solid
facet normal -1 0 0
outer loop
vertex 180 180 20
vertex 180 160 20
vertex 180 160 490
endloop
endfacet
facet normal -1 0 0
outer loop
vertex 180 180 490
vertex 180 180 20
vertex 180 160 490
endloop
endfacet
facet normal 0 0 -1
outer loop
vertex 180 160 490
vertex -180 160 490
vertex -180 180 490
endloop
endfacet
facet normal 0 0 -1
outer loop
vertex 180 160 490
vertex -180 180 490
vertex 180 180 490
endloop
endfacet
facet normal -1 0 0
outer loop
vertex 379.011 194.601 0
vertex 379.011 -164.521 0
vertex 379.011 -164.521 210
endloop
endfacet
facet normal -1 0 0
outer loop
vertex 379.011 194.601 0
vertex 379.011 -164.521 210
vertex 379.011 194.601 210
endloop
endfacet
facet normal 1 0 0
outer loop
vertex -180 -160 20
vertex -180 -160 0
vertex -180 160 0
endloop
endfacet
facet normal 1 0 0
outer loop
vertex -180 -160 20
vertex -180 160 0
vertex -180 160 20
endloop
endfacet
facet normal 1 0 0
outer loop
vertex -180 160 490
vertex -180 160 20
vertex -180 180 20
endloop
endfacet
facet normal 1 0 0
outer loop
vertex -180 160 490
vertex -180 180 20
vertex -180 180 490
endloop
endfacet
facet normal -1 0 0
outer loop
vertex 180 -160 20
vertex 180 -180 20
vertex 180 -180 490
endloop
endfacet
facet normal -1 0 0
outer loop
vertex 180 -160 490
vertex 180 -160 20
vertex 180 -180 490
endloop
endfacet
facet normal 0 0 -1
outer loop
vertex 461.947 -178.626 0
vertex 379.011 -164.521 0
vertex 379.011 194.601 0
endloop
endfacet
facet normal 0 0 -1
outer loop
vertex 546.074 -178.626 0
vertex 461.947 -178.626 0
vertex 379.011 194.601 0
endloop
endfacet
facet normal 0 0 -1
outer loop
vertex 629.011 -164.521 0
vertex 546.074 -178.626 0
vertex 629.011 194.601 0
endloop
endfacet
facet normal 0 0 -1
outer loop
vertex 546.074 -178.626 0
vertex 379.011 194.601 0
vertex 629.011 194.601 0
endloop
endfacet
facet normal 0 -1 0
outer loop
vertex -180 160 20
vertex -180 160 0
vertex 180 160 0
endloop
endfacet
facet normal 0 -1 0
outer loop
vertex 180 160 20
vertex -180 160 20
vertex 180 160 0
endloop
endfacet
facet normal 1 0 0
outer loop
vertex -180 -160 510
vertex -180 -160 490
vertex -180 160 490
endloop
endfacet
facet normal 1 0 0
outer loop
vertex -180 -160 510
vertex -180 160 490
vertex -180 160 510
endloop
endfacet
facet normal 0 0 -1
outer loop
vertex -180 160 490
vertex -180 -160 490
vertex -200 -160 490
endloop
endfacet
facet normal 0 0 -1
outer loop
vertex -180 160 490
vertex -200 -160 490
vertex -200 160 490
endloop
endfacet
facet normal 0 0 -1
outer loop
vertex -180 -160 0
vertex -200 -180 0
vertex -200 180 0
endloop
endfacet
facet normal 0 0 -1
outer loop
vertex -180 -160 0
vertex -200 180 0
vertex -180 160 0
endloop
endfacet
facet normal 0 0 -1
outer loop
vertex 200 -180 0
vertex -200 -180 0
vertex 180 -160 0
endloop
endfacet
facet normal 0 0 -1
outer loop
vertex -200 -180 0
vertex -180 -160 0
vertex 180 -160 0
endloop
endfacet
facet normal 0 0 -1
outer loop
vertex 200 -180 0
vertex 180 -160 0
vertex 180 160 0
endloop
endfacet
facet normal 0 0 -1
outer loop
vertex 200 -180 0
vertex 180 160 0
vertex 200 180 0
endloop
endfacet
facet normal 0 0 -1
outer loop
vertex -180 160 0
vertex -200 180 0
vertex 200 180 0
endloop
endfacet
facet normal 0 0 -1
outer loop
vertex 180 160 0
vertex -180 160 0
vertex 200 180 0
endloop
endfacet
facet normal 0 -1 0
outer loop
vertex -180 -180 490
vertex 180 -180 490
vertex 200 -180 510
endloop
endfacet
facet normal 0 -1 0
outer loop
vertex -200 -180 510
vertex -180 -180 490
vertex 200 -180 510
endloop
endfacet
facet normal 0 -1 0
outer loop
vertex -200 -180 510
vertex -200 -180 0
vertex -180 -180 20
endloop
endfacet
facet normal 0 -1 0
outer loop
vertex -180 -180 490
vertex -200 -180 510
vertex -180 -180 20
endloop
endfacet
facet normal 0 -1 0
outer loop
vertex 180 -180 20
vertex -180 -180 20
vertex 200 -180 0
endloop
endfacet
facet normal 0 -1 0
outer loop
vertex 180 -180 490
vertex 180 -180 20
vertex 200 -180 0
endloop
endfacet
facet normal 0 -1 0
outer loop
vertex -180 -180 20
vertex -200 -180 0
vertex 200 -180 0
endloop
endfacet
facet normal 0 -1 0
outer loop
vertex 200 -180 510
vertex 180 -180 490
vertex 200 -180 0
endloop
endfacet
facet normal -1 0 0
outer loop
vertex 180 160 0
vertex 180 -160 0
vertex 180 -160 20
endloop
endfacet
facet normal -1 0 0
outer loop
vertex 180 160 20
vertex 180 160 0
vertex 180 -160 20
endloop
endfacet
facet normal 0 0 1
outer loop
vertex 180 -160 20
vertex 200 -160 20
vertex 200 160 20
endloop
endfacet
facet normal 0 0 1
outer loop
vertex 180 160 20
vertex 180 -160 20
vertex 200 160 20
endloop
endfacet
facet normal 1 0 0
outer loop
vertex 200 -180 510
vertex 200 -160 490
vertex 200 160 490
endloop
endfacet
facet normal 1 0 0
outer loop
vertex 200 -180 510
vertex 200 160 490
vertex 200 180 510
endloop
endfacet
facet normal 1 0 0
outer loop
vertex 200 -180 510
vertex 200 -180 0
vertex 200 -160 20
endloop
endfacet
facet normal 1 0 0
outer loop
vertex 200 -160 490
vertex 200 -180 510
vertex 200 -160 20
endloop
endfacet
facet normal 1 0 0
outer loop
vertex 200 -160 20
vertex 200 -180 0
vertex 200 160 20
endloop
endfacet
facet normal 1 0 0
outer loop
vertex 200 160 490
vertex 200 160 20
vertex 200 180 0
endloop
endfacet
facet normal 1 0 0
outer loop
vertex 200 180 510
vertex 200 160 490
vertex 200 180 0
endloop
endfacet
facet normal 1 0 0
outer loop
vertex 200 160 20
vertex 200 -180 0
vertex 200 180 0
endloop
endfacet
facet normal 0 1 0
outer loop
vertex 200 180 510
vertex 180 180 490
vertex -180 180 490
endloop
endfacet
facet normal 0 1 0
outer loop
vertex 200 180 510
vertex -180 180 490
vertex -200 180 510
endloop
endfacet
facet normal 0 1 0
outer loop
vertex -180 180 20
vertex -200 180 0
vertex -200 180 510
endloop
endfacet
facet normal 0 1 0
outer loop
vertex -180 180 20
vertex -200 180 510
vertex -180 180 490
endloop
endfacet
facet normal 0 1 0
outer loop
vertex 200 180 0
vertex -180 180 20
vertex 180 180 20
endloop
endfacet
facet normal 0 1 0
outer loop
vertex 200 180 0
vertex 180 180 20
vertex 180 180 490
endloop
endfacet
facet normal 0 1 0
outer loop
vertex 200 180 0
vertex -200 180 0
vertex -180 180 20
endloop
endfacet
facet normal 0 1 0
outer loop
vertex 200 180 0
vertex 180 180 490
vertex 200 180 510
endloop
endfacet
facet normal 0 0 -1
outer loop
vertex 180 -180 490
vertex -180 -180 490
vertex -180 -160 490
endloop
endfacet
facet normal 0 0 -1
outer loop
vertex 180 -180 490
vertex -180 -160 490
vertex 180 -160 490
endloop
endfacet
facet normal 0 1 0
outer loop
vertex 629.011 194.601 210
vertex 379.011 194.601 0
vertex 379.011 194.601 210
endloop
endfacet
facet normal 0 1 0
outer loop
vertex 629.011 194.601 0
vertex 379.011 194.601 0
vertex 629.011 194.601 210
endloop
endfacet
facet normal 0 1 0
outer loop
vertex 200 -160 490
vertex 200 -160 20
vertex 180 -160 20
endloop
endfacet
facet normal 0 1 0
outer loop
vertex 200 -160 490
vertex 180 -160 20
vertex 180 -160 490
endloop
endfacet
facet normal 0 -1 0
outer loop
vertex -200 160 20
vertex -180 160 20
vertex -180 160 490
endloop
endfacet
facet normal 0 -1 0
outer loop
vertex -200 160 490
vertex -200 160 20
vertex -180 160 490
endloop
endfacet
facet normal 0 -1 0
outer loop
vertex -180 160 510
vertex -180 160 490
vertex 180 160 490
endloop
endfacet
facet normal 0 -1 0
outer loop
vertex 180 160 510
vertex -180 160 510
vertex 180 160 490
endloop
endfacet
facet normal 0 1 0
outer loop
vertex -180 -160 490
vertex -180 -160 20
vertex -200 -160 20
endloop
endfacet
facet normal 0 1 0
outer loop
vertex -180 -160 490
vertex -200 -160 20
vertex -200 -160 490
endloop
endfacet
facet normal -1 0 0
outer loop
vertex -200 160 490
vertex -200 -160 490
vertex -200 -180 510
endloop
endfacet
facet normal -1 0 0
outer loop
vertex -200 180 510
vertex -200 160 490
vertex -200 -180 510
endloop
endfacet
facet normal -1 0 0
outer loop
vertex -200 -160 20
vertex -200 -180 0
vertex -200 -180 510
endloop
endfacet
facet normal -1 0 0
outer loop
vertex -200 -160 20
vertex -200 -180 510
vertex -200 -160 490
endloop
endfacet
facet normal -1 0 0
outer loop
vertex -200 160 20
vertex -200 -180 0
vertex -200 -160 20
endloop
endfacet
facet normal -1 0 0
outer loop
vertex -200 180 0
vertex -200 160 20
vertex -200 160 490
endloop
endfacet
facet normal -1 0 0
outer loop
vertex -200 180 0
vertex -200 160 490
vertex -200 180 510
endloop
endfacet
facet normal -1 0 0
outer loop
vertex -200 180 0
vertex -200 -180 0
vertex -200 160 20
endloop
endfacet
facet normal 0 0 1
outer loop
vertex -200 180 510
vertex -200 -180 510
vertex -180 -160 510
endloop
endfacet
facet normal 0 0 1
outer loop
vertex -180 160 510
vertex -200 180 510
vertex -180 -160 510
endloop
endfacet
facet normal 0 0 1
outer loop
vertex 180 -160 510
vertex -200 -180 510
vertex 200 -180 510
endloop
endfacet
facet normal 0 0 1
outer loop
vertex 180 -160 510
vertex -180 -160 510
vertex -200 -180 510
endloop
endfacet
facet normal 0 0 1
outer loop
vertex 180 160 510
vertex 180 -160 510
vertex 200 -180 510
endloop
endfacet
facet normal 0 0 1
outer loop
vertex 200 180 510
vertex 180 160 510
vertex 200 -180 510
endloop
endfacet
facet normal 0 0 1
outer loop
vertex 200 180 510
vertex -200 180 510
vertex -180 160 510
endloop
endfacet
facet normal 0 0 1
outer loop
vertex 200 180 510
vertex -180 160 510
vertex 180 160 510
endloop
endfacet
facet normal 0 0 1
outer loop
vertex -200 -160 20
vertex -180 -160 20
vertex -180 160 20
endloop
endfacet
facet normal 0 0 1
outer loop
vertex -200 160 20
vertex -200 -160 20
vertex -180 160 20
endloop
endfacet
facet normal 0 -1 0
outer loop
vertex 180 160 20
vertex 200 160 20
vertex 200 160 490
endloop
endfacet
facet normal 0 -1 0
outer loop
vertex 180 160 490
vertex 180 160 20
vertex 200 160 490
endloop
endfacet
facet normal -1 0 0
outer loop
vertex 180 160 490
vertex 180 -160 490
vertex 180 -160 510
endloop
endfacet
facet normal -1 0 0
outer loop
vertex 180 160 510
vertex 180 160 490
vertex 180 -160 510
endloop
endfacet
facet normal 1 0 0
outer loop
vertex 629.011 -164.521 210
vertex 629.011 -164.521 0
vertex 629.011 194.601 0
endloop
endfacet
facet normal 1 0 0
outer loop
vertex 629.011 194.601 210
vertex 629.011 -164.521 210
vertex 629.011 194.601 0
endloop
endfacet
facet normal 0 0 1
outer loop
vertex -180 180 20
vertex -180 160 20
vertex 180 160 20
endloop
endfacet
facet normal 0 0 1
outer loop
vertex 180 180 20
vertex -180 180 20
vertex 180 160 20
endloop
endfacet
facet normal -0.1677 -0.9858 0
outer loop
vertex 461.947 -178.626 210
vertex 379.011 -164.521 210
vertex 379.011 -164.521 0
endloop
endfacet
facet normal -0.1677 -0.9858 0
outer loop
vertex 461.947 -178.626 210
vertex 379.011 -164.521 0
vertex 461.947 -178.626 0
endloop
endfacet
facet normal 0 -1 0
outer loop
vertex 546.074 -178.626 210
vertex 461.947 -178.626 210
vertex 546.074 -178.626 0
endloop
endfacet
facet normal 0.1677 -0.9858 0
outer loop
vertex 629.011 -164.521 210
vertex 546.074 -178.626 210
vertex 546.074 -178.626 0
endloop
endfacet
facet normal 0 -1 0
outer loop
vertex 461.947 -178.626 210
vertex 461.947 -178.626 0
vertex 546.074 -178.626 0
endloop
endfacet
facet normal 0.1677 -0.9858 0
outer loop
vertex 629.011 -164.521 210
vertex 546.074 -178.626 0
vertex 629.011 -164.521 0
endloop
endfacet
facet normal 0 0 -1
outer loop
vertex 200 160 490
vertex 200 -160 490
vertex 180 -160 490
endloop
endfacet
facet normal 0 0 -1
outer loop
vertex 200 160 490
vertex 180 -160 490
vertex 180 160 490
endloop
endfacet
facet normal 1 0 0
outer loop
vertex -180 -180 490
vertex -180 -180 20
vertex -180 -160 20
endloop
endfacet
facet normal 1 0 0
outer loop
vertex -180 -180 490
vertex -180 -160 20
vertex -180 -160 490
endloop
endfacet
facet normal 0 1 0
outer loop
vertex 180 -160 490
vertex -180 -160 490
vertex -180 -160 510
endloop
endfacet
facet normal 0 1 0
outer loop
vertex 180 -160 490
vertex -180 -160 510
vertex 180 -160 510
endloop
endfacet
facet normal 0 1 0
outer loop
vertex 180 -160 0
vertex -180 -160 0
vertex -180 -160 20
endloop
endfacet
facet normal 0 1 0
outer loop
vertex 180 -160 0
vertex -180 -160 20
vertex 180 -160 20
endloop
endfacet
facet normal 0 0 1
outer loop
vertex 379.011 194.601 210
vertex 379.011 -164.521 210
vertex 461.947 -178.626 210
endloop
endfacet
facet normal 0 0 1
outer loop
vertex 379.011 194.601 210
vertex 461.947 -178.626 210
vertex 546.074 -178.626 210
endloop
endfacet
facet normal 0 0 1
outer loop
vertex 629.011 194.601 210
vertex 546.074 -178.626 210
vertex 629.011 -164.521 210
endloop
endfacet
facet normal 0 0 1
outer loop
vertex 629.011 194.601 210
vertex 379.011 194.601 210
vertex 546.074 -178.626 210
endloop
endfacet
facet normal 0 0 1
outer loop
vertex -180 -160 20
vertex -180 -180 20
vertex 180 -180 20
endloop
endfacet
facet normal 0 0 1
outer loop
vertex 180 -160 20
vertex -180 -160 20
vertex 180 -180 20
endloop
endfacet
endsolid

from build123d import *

# Parameters (mm, degrees)
F0_W     = 400
F0_H     = 360
F0_W_2   = 360
F0_H_2   = 320
F1_DEPTH = 510
F2_W     = 360
F2_H     = 470
F3_DEPTH = 638.111826
F4_W     = 320
F4_H     = 470
F5_DEPTH = 520
F0_W_3   = 250
F0_H_3   = 359.122919
F6_DEPTH = 210


with BuildPart() as f1:
    # F0 (on Top) → F1 (new body)
    with BuildSketch(Plane.XY):
        Rectangle(F0_W, F0_H)
        Rectangle(F0_W_2, F0_H_2, mode=Mode.SUBTRACT)
    extrude(amount=F1_DEPTH)

    # F2 (on face) → F3 (cut)
    with BuildSketch(Plane.XZ.offset(180)):
        with Locations((0, 255)):
            Rectangle(F2_W, F2_H)
    extrude(amount=-F3_DEPTH, mode=Mode.SUBTRACT)

    # F4 (on face) → F5 (cut)
    with BuildSketch(Plane.YZ.offset(200)):
        with Locations((0, 255)):
            Rectangle(F4_W, F4_H)
    extrude(amount=-F5_DEPTH, mode=Mode.SUBTRACT)


with BuildPart() as f6:
    # F0 (on Top) → F6 (new body)
    with BuildSketch(Plane.XY):
        with BuildLine():
            Line((629.010856, -164.521456), (379.010856, -164.521456))
            ThreePointArc((379.010856, -164.521456), (504.010856, -180.398537), (629.010856, -164.521456))
        make_face()
        with Locations((504.010856, 15.040003)):
            Rectangle(F0_W_3, F0_H_3)
    extrude(amount=F6_DEPTH)


solid = Compound([f1.part, f6.part])
